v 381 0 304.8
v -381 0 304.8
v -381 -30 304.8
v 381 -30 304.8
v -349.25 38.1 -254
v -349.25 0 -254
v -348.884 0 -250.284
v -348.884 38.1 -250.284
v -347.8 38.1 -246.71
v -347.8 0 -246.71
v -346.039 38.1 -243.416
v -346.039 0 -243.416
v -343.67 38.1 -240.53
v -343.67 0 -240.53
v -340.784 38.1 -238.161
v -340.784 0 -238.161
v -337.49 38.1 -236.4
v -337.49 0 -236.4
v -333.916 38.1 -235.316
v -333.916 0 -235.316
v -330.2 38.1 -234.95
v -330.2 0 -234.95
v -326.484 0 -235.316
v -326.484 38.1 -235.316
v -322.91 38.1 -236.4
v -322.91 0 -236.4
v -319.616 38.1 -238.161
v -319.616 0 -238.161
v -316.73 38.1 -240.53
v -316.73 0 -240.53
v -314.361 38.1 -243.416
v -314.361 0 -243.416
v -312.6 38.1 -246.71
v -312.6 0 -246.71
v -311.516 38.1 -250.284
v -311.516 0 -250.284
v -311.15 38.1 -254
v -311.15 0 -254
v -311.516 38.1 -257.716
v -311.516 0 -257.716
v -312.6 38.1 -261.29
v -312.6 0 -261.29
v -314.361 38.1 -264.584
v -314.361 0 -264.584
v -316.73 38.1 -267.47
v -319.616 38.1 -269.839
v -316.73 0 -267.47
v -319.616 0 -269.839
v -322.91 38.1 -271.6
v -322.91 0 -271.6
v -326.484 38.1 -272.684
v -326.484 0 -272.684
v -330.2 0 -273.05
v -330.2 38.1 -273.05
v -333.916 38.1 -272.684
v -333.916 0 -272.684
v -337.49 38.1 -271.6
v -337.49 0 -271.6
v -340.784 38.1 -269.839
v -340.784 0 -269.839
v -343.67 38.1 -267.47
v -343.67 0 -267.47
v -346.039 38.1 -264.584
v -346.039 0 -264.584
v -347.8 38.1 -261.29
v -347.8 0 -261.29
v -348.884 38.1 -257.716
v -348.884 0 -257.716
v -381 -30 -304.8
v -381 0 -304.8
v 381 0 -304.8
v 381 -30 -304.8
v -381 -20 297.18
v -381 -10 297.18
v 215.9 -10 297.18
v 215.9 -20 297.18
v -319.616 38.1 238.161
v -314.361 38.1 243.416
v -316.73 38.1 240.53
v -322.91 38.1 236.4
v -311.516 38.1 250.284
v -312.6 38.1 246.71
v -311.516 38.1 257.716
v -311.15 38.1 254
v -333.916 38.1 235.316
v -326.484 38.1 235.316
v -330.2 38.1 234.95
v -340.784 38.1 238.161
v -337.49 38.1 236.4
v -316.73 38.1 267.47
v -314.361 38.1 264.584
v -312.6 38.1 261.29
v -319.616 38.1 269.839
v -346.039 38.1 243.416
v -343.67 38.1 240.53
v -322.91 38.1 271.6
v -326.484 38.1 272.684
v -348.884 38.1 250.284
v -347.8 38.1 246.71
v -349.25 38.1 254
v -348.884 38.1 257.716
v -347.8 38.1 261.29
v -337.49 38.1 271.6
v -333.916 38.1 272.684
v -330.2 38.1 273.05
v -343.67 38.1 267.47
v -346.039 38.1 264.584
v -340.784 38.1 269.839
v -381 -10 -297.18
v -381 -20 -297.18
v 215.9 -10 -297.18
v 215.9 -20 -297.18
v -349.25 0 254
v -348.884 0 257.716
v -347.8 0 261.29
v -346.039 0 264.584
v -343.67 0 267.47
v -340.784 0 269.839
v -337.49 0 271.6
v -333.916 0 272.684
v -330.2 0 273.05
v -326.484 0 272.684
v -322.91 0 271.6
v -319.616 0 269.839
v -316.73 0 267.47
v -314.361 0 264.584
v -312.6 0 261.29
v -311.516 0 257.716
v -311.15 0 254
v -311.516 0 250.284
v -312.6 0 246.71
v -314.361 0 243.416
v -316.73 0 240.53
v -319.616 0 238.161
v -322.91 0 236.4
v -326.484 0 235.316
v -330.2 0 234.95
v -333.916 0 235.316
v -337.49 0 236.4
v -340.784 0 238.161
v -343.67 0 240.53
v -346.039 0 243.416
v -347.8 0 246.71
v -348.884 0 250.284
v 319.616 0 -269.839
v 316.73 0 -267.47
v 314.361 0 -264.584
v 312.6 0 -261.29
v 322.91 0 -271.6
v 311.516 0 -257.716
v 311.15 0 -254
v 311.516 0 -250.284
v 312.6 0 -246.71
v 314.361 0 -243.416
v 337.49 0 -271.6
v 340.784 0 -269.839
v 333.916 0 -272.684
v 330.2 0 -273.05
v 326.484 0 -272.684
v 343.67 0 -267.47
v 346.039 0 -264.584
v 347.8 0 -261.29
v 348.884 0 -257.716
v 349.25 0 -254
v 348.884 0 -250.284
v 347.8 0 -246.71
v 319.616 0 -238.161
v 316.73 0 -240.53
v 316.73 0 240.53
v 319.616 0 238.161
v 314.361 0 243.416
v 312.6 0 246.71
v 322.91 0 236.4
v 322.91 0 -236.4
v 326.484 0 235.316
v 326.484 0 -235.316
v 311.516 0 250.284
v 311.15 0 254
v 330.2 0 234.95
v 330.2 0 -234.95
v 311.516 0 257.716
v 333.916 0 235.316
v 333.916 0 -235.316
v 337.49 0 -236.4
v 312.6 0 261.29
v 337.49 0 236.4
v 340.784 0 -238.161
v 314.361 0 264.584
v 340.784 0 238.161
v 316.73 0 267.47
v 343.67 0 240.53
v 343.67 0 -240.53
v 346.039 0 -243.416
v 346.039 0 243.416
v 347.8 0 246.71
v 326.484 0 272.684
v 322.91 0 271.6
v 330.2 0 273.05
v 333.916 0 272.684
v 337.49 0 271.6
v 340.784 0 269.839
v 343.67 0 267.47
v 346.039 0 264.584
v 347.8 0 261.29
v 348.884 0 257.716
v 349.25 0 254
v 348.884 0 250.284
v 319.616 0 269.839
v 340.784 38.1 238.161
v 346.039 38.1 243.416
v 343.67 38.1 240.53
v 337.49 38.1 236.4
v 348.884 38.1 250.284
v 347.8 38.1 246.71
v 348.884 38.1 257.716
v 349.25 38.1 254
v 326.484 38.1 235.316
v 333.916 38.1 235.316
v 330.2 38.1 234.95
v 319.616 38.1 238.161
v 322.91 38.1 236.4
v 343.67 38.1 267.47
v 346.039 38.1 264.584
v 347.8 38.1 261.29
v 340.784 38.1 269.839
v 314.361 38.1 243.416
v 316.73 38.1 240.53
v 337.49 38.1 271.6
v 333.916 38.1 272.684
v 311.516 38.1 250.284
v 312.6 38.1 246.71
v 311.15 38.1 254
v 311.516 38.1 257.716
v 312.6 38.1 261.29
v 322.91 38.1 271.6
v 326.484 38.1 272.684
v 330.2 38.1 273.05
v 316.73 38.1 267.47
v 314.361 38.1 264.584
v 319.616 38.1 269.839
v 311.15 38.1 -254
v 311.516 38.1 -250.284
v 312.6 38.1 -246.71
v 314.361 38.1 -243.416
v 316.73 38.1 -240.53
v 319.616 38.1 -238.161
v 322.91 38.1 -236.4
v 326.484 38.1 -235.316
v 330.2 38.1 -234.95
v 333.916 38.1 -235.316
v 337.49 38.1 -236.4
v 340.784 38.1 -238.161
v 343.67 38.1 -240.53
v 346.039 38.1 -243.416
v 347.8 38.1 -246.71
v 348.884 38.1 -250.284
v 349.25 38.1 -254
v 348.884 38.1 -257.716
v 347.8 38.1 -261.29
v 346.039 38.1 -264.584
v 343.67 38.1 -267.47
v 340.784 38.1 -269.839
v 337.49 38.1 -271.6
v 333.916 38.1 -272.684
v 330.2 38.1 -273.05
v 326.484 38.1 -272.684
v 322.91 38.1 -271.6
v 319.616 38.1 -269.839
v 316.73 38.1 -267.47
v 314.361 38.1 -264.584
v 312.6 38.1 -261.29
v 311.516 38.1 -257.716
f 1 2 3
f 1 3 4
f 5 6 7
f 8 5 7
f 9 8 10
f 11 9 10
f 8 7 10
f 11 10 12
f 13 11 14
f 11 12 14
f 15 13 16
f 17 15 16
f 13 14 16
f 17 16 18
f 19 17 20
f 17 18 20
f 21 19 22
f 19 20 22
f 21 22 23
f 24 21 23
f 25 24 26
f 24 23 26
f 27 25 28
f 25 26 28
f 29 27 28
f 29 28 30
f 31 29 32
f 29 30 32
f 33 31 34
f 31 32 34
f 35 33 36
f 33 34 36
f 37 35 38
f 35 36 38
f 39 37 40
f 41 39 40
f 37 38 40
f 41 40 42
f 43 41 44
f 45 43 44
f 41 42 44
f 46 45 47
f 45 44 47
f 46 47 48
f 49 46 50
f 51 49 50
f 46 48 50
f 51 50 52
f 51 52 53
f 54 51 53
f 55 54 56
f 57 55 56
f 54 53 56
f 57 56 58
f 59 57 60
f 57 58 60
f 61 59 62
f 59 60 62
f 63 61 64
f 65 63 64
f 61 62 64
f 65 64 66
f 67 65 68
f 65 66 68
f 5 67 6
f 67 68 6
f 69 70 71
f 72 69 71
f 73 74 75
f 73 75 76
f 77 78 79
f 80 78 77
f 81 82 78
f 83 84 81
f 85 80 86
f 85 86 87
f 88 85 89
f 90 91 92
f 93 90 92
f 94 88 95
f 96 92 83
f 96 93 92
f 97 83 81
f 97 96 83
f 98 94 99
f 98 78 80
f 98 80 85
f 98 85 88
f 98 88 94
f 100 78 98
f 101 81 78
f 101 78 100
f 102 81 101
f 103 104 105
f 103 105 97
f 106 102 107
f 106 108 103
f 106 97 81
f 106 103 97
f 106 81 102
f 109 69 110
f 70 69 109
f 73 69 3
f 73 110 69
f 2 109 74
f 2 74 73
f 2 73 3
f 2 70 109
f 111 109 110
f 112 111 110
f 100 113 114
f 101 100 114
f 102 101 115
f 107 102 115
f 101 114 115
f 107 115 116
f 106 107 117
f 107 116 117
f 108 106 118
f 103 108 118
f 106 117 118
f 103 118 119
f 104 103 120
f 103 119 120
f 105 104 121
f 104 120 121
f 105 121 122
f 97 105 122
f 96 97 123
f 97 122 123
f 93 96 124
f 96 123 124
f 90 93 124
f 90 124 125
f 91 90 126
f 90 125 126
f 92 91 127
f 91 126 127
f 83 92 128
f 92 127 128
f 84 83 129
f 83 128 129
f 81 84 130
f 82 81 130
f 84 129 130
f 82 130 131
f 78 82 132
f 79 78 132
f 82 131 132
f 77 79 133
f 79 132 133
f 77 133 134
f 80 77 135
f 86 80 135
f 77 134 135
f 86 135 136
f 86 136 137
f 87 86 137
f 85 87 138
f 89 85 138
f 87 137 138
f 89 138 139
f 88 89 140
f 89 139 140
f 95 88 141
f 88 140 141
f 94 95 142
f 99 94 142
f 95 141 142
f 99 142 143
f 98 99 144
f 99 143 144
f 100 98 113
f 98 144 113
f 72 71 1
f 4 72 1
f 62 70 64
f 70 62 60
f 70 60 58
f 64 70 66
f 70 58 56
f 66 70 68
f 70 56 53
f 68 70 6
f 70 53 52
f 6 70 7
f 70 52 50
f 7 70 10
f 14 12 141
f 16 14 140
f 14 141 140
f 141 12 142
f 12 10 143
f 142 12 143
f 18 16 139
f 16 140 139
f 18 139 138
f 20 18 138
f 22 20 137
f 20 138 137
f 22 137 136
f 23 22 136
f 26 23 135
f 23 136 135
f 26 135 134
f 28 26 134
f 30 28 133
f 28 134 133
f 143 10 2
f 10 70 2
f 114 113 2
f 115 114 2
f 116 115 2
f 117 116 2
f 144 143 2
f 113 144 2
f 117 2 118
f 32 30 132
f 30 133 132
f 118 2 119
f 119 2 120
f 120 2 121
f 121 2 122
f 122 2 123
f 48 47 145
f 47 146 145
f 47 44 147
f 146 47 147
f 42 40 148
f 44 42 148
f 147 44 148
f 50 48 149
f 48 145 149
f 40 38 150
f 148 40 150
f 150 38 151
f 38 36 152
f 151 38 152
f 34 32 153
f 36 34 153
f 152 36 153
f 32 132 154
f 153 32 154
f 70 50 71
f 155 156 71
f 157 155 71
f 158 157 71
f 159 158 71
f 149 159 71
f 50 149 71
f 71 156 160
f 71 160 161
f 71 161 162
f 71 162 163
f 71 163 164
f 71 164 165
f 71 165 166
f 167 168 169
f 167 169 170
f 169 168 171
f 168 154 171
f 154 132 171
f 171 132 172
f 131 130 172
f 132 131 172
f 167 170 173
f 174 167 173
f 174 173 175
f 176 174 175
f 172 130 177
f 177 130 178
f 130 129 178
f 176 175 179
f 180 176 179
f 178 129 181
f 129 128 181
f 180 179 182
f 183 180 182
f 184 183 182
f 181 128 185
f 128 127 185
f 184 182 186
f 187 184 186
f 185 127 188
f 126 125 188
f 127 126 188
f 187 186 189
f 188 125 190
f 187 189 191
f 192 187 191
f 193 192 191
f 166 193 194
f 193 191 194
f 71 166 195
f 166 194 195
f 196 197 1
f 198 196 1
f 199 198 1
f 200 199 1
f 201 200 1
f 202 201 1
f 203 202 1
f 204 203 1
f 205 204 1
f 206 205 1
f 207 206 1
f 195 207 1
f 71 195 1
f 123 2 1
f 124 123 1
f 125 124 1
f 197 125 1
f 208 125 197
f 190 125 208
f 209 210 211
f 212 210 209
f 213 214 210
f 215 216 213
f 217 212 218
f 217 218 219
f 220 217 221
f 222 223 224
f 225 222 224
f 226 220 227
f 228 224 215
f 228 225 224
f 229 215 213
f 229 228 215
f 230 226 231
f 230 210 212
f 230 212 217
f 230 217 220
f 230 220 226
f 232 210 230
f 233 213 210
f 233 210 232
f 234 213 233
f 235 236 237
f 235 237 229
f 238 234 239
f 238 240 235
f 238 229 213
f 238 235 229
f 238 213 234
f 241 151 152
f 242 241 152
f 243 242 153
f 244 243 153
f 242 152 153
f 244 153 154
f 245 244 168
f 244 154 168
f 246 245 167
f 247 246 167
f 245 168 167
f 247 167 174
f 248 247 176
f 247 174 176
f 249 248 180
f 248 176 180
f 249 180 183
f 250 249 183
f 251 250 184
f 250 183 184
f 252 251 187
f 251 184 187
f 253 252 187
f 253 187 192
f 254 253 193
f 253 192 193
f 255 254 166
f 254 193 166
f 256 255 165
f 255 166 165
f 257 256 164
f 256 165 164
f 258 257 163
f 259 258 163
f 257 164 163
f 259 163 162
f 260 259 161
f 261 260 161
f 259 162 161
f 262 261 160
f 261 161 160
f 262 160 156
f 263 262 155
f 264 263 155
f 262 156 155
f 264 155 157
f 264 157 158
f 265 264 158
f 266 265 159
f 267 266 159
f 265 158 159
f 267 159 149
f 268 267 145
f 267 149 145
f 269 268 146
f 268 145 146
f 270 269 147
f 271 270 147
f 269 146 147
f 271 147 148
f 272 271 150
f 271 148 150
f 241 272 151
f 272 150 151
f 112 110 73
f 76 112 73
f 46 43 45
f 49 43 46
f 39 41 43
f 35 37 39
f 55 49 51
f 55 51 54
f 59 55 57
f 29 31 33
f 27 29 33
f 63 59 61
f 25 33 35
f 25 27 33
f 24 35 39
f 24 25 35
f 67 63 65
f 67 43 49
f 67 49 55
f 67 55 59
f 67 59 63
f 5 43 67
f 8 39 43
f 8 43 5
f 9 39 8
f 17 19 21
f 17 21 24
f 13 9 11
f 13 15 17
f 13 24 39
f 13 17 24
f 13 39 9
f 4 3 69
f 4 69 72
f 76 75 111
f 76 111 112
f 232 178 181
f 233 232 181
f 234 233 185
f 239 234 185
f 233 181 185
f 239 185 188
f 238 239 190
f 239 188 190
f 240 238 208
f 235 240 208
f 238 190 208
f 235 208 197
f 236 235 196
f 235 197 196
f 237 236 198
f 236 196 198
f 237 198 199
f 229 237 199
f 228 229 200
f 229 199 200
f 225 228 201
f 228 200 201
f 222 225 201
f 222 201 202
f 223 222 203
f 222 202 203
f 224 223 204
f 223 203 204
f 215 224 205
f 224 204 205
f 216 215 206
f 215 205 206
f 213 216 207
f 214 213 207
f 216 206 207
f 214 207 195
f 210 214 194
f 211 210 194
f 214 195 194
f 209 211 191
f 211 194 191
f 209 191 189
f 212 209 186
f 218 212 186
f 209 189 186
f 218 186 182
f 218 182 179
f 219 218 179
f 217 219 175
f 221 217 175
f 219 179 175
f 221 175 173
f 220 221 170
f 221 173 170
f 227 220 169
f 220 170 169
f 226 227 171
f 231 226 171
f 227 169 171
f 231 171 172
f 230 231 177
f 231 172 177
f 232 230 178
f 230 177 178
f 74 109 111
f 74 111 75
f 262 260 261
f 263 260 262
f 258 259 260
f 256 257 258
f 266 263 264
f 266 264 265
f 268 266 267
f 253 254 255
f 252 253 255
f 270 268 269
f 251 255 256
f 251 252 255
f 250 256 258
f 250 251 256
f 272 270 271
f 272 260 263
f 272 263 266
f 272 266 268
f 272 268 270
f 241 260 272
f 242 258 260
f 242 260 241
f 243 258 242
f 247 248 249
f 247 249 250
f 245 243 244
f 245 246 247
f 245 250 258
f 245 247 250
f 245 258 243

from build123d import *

# Parameters (mm, degrees)
F0_W     = 762
F0_H     = 609.6
F1_DEPTH = 30
F2_W     = 10
F2_H     = 594.36
F3_DEPTH = 596.9
F4_R     = 19.05
F5_DEPTH = 38.1


with BuildPart() as f1:
    # F0 (on Front) → F1 (new body)
    with BuildSketch(Plane.XZ):
        Rectangle(F0_W, F0_H)
    extrude(amount=F1_DEPTH)

    # F2 (on face) → F3 (cut)
    with BuildSketch(Plane(origin=(-381, 0, 0), x_dir=(0, -1, 0), z_dir=(-1, 0, 0))):
        with Locations((15, 0)):
            Rectangle(F2_W, F2_H)
    extrude(amount=-F3_DEPTH, mode=Mode.SUBTRACT)

    # F4 (on face) → F5 (join)
    with BuildSketch(Plane(origin=(0, 0, 0), x_dir=(-1, 0, 0), z_dir=(0, 1, 0))):
        with Locations((-330.2, 254)):
            Circle(F4_R)
        with Locations((330.2, 254)):
            Circle(F4_R)
        with Locations((330.2, -254)):
            Circle(F4_R)
        with Locations((-330.2, -254)):
            Circle(F4_R)
    extrude(amount=F5_DEPTH)


solid = f1.part
